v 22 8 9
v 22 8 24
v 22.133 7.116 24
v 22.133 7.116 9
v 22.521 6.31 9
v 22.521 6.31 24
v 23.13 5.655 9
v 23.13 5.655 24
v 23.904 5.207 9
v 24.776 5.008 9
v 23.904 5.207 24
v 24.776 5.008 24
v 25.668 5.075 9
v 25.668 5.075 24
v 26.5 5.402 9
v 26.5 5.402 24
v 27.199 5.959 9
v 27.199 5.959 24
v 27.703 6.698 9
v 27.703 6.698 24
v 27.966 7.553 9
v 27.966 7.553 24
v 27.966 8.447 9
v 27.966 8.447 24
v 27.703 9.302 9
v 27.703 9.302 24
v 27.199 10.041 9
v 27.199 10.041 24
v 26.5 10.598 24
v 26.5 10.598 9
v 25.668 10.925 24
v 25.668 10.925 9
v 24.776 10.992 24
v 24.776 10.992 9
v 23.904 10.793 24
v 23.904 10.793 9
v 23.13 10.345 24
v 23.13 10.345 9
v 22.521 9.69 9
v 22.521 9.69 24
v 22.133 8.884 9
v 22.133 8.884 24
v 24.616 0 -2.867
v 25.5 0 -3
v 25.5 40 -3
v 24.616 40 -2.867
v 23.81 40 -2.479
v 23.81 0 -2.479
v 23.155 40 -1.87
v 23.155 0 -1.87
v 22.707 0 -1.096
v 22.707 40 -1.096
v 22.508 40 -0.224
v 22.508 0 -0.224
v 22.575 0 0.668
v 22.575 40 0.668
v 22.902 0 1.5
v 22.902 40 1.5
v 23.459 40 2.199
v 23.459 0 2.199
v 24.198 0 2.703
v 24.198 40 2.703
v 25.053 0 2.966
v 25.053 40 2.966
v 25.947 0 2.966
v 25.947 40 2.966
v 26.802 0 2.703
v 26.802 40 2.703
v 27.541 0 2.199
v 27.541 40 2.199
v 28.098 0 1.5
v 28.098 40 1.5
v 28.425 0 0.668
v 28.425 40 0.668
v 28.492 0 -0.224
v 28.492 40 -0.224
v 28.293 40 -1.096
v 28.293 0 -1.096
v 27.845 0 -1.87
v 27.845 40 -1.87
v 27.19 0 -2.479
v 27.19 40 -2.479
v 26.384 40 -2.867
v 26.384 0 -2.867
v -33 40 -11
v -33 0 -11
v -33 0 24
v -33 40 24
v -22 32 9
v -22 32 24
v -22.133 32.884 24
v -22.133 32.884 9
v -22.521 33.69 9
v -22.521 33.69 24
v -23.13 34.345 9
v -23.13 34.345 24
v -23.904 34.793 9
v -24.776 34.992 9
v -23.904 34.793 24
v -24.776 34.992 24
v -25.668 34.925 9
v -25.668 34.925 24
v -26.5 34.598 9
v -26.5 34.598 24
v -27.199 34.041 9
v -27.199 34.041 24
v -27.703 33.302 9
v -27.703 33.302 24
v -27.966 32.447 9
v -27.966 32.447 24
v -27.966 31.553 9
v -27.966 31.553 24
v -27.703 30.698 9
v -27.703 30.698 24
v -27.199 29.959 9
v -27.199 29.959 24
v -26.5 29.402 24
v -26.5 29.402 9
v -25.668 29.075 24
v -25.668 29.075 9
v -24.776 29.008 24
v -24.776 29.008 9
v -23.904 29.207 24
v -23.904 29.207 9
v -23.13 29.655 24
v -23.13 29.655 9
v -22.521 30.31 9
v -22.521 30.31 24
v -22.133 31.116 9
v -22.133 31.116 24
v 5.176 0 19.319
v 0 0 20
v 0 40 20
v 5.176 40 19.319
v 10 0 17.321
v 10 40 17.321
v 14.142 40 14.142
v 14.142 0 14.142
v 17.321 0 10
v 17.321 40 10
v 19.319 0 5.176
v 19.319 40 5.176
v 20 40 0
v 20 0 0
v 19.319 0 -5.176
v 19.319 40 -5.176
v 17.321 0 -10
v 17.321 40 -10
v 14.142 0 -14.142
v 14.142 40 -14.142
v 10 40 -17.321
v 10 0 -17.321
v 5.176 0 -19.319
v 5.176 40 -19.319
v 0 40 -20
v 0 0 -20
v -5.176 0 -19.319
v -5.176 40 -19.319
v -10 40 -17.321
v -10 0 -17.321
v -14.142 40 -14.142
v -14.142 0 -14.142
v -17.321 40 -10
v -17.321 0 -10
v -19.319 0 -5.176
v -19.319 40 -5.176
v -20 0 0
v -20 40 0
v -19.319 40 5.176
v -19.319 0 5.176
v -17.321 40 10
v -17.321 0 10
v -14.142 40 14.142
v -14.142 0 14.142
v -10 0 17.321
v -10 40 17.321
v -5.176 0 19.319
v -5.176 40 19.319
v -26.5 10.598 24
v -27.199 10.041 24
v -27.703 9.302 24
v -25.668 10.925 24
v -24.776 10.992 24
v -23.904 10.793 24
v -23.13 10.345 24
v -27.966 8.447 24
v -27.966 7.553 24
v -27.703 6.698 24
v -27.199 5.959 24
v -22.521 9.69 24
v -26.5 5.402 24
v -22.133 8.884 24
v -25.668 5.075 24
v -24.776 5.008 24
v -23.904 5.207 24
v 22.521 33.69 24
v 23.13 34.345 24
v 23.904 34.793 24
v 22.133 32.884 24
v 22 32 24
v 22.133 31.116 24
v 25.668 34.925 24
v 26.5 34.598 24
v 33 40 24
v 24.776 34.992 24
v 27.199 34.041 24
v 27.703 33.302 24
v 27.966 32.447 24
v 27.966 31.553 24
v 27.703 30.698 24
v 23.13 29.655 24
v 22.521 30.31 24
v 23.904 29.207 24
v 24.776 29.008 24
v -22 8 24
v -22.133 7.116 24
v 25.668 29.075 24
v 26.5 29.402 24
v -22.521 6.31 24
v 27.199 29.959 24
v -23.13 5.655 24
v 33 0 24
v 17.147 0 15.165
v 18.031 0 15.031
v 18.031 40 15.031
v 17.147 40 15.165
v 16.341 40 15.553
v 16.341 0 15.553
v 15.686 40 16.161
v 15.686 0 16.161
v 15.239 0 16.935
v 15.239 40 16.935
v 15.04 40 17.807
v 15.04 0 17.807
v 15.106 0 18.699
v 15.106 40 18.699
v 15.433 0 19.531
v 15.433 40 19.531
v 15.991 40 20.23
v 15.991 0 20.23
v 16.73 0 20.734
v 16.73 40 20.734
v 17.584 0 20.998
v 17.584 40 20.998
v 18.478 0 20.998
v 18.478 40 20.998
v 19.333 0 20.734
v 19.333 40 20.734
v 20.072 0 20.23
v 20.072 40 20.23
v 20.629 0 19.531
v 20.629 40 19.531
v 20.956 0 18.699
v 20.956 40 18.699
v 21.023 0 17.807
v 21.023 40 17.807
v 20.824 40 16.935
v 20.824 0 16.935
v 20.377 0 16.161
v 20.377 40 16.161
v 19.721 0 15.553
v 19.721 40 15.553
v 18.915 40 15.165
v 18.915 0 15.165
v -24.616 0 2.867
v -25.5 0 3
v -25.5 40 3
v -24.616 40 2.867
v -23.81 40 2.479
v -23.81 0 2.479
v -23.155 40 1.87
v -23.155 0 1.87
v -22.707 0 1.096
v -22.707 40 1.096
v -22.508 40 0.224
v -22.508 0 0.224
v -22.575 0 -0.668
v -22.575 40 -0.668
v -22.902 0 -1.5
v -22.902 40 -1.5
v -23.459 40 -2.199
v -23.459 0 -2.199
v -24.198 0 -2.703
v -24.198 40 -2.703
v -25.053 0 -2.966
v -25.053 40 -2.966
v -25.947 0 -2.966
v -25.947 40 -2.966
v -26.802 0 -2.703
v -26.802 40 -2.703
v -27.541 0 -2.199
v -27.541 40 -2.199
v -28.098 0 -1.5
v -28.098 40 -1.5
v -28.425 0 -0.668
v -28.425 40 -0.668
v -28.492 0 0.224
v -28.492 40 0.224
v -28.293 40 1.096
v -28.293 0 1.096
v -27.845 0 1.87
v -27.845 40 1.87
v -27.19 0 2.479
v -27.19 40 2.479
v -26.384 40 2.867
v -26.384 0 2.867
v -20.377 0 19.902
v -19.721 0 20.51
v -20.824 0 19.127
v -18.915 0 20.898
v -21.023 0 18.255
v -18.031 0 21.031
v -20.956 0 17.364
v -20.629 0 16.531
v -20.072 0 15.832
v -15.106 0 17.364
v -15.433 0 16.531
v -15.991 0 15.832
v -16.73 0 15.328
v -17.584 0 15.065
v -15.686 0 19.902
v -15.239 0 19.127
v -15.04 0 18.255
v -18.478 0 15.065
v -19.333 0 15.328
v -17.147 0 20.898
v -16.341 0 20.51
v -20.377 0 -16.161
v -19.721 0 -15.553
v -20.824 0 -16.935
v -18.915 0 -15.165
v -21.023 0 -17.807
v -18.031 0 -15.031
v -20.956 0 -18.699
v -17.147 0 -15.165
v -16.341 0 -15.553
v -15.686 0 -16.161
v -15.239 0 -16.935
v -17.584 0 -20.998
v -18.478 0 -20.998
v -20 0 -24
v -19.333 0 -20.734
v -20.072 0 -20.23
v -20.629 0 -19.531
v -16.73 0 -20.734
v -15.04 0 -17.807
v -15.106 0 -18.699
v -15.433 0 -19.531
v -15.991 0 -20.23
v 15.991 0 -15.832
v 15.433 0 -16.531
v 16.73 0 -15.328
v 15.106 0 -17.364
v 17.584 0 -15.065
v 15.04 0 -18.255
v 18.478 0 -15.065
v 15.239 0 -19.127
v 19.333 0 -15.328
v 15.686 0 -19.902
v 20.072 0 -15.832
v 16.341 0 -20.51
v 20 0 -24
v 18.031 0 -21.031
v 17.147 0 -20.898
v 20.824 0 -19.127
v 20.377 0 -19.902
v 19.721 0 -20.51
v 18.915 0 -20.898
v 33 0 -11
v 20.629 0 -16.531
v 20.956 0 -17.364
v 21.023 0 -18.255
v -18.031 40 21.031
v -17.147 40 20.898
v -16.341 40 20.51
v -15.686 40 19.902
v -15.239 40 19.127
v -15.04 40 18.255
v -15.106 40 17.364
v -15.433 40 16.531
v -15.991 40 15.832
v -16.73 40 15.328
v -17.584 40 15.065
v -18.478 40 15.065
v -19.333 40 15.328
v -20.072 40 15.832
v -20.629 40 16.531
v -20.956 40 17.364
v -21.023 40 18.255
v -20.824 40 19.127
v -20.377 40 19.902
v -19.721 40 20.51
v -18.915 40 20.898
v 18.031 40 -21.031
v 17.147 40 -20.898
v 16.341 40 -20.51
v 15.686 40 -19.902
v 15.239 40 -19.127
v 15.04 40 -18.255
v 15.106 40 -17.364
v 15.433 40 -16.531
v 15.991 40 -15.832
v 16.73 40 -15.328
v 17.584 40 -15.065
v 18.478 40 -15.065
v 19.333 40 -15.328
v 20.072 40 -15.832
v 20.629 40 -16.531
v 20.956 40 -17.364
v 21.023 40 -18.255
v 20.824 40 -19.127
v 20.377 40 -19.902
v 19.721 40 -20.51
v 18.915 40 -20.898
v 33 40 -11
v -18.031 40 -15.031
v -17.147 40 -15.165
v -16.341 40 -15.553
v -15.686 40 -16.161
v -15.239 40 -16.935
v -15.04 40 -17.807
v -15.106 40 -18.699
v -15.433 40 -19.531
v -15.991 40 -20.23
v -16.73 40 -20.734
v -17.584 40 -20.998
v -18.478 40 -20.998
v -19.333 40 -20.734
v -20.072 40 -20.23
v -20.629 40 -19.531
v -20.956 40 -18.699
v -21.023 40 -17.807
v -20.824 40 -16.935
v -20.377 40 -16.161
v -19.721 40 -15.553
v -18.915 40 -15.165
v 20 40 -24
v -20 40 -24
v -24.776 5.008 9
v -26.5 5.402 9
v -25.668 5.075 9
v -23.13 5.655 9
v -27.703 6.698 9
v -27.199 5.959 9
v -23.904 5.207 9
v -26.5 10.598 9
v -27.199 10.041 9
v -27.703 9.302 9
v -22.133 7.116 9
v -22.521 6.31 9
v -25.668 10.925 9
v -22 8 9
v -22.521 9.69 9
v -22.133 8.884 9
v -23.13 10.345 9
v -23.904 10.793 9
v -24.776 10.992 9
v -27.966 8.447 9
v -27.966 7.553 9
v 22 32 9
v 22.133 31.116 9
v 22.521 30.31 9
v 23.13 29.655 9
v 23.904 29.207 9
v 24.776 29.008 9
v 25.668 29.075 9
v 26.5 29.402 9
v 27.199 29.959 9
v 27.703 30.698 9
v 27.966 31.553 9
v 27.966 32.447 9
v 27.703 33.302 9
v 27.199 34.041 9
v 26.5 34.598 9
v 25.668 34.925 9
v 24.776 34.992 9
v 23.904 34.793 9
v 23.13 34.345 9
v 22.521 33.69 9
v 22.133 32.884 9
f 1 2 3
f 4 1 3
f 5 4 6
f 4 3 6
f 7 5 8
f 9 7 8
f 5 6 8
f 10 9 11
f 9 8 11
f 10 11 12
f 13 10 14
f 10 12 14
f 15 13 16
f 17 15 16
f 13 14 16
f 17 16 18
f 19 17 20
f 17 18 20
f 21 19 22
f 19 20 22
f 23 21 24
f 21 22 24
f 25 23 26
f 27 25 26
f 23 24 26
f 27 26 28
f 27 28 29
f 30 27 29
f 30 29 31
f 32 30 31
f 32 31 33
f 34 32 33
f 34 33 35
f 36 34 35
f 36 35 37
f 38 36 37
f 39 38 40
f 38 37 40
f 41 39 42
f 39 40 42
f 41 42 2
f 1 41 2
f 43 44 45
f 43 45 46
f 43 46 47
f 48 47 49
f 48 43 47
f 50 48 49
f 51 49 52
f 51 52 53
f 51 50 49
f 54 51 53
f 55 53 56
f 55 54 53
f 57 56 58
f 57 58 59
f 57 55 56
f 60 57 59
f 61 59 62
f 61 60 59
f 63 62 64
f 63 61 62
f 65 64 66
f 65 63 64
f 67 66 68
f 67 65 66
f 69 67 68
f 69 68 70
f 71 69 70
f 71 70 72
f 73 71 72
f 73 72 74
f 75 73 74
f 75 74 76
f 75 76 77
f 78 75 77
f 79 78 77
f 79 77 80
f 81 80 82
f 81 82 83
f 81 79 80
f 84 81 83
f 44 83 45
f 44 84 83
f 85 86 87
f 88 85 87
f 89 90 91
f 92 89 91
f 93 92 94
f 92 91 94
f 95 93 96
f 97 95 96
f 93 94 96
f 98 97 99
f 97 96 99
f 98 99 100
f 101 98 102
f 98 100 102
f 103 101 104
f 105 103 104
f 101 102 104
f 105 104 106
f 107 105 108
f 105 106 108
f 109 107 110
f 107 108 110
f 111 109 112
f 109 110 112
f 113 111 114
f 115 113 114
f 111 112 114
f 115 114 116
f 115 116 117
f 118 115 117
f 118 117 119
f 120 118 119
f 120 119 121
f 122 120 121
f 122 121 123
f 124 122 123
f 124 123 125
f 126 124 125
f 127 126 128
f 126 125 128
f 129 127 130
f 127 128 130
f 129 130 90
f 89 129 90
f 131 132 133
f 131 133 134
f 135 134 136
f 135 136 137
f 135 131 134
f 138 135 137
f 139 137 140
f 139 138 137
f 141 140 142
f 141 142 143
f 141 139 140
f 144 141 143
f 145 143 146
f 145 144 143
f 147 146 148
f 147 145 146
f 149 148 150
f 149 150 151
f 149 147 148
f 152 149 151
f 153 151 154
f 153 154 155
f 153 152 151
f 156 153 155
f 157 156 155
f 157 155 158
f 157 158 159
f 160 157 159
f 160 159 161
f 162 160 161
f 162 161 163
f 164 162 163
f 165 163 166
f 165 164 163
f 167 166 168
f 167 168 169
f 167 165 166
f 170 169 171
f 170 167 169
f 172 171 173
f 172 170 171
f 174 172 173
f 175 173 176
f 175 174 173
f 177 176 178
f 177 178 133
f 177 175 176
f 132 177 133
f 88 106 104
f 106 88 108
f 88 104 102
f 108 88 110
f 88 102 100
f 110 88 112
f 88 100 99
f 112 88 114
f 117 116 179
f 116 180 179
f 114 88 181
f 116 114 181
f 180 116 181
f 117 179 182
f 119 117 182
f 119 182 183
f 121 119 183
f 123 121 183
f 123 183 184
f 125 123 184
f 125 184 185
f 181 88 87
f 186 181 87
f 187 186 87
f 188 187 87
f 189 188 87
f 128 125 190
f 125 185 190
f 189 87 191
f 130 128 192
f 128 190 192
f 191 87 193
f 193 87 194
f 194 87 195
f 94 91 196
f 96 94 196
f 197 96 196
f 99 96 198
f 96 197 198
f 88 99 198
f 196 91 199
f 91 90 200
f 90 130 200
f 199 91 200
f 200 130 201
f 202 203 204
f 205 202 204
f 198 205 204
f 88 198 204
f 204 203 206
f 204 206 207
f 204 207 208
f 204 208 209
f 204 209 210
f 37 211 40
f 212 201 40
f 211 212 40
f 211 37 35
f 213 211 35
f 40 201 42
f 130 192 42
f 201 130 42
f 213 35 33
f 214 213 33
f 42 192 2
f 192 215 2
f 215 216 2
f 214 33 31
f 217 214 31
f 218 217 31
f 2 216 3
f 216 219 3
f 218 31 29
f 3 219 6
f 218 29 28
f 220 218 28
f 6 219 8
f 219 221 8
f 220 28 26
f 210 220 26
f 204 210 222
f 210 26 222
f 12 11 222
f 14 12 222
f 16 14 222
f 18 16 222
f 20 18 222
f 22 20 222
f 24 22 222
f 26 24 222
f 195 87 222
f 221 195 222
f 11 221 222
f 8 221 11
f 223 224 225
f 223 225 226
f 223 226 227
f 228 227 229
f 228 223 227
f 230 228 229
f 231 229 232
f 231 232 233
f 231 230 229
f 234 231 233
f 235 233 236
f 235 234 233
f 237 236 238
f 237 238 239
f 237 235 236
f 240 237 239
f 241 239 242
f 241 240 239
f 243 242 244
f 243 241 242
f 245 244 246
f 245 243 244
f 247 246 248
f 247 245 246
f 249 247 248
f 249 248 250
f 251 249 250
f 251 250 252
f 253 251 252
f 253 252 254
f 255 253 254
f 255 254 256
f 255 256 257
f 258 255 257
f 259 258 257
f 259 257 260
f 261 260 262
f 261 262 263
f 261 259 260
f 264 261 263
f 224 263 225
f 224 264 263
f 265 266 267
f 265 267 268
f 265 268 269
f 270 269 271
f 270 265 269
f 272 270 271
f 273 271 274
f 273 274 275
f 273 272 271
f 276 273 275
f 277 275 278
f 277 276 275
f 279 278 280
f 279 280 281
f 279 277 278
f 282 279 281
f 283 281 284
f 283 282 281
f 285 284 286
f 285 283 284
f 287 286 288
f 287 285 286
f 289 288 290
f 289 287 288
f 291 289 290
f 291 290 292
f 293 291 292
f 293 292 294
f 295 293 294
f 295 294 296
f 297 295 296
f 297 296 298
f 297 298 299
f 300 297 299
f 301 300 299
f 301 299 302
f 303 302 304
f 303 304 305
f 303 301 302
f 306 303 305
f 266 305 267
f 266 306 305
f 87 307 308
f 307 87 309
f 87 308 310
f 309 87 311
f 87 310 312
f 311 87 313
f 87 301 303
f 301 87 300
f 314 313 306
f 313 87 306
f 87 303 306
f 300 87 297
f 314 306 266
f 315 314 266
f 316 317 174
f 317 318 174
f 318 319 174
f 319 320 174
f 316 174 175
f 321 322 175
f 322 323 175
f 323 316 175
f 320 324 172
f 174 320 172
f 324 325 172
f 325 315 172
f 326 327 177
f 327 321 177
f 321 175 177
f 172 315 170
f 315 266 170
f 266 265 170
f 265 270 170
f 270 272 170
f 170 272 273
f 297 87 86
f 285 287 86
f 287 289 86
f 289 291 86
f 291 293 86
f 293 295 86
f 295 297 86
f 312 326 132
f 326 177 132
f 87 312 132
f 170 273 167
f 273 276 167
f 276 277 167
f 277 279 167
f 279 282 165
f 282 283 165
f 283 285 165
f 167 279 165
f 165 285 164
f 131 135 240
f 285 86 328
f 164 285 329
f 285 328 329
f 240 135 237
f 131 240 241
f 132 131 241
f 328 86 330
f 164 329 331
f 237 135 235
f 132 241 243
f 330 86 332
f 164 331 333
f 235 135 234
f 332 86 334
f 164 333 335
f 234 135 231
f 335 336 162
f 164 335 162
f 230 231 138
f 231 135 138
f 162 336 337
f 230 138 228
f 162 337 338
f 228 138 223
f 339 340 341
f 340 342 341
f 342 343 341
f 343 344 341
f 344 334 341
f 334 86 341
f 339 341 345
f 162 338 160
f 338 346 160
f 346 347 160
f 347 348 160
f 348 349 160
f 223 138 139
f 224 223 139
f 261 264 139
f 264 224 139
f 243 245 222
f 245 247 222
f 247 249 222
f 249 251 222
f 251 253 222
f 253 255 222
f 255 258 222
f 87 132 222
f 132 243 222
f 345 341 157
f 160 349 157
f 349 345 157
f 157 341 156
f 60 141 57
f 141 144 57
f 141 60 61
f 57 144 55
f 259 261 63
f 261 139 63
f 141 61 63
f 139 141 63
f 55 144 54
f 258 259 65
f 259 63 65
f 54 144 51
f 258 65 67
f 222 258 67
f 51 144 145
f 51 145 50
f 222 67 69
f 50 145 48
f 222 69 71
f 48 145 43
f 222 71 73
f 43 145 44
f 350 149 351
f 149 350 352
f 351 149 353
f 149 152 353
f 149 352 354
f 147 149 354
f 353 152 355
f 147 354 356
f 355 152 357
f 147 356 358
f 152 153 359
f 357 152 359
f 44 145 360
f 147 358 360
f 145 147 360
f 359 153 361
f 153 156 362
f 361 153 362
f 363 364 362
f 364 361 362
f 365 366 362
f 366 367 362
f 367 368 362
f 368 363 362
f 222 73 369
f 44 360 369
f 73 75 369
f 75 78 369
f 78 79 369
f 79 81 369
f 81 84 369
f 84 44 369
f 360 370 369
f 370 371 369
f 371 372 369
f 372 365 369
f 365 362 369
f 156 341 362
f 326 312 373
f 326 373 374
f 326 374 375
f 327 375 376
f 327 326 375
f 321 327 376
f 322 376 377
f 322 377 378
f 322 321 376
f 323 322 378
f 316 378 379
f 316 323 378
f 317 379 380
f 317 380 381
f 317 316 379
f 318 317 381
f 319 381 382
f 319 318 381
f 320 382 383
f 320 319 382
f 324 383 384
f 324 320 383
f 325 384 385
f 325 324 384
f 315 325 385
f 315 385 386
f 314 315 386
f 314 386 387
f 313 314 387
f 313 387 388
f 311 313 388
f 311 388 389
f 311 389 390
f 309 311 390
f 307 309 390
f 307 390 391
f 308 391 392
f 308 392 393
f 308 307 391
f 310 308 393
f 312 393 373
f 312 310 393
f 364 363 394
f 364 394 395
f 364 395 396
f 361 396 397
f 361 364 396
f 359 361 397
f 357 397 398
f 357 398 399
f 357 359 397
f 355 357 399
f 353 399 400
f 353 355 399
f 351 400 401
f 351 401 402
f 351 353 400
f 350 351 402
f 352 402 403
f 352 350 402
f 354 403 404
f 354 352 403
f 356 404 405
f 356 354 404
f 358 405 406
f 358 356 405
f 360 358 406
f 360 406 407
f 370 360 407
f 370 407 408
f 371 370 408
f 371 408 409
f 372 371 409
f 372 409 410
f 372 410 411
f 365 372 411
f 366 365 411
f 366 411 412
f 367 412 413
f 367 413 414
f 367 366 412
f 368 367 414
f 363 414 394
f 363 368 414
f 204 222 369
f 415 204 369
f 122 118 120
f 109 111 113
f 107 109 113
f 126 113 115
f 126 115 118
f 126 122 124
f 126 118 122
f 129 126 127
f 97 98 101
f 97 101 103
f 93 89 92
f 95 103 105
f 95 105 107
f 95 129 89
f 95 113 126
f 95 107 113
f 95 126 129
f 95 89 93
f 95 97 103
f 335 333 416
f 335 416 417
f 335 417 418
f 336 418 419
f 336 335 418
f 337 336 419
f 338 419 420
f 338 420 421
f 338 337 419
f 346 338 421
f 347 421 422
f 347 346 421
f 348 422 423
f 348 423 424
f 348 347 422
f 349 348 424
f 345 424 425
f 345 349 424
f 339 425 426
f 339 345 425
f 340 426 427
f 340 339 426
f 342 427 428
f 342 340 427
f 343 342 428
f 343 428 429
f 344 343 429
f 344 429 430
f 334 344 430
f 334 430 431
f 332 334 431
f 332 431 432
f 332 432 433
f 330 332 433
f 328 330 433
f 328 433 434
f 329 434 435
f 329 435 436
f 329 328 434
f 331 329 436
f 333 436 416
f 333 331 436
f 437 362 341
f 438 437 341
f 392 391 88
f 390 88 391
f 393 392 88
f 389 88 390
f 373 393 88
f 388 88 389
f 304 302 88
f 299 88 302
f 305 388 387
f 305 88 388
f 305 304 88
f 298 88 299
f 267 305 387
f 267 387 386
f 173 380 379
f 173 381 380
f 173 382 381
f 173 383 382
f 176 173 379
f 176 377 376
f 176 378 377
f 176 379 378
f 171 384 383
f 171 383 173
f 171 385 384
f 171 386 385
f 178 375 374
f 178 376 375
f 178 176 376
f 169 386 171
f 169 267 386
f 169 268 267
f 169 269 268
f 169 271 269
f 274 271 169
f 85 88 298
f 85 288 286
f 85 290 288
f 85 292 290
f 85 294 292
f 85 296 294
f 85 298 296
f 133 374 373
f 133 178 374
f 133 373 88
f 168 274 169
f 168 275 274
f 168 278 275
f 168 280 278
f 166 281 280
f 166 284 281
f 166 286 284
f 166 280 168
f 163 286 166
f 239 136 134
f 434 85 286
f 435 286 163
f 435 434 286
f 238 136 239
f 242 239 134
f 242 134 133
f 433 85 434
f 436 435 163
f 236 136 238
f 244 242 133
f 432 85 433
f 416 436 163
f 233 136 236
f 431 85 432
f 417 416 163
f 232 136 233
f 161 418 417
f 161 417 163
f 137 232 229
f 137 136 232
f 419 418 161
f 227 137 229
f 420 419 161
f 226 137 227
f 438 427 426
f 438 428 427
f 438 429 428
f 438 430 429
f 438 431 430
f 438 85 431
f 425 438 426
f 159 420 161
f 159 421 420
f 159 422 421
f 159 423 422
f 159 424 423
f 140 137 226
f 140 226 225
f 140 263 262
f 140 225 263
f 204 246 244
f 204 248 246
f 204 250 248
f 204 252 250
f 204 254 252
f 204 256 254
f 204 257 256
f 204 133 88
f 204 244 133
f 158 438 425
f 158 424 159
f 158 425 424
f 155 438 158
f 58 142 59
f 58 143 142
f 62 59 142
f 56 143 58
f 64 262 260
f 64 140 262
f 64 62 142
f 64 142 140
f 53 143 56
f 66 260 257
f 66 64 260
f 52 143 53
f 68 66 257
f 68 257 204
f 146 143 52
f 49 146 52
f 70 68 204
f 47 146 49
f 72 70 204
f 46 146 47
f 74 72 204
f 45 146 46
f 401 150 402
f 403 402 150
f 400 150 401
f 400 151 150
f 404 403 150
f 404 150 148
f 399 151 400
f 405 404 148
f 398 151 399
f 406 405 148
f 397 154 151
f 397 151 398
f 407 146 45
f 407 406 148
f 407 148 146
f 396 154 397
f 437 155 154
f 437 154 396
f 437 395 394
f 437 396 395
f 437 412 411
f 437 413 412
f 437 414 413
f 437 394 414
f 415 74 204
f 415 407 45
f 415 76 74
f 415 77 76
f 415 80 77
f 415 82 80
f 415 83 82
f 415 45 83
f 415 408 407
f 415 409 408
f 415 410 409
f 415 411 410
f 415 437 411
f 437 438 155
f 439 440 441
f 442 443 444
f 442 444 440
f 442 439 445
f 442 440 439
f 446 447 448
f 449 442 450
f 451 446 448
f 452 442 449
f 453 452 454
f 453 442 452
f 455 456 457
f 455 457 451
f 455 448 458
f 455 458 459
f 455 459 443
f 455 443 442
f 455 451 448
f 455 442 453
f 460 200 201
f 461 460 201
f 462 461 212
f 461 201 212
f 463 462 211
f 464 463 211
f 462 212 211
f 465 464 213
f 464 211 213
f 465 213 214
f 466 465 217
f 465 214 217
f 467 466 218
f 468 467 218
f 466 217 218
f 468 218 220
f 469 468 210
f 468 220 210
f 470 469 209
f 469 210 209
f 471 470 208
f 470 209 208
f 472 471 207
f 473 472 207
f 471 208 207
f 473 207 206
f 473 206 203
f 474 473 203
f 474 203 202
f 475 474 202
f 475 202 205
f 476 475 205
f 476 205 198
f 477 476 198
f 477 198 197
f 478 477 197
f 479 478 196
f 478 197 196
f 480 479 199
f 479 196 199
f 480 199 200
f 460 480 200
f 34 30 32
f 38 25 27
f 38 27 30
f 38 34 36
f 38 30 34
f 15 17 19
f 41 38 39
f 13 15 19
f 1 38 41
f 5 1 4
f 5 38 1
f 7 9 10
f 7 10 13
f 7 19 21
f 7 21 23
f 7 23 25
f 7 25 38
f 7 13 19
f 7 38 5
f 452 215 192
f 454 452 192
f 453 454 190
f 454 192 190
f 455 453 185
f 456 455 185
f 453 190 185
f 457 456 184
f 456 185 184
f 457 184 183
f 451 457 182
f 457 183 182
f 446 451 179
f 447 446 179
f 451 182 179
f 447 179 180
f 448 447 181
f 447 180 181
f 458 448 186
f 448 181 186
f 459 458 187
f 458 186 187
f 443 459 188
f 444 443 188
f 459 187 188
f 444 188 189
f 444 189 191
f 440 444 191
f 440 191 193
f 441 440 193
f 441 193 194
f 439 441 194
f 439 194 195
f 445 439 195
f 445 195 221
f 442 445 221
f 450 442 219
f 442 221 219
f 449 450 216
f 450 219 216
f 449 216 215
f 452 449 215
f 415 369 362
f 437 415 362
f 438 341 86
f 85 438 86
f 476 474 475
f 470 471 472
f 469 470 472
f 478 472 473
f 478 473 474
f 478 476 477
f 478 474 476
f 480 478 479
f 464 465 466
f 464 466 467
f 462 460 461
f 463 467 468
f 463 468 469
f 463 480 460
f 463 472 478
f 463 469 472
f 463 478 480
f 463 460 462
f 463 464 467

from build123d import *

# Parameters (mm, degrees)
SKETCH_1_R          = 20
SKETCH_1_R_2        = 3
EXTRUDE_1_DEPTH     = 40
SKETCH_2_R          = 3
CUT_EXTRUDE_1_DEPTH = 15


with BuildPart() as part:
    # 草图1 → 凸台-拉伸1 (new body)
    with BuildSketch(Plane(origin=(0, 0, 0), x_dir=(1, 0, 0), z_dir=(0, 1, 0))):
        Polygon((-33, -24), (33, -24), (33, 11), (20, 24), (-20, 24), (-33, 11), align=None)
        with Locations(Location((0, 0, 0), (0, 0, 270))):
            Circle(SKETCH_1_R, mode=Mode.SUBTRACT)
        with Locations(Location((-25.5, 0, 0), (0, 0, 270))):
            Circle(SKETCH_1_R_2, mode=Mode.SUBTRACT)
        with Locations(Location((-18.03122292, 18.03122292, 0), (0, 0, 270))):
            Circle(SKETCH_1_R_2, mode=Mode.SUBTRACT)
        with Locations(Location((-18.03122292, -18.03122292, 0), (0, 0, 270))):
            Circle(SKETCH_1_R_2, mode=Mode.SUBTRACT)
        with Locations(Location((18.03122292, -18.03122292, 0), (0, 0, 90))):
            Circle(SKETCH_1_R_2, mode=Mode.SUBTRACT)
        with Locations(Location((18.03122292, 18.03122292, 0), (0, 0, 90))):
            Circle(SKETCH_1_R_2, mode=Mode.SUBTRACT)
        with Locations(Location((25.5, 0, 0), (0, 0, 90))):
            Circle(SKETCH_1_R_2, mode=Mode.SUBTRACT)
    extrude(amount=EXTRUDE_1_DEPTH)

    # 草图2 → 切除-拉伸1 (cut)
    with BuildSketch(Plane.XY.offset(24)):
        with Locations((-25, 32)):
            Circle(SKETCH_2_R)
        with Locations((-25, 8)):
            Circle(SKETCH_2_R)
        with Locations(Location((25, 8, 0), (0, 0, 180))):
            Circle(SKETCH_2_R)
        with Locations(Location((25, 32, 0), (0, 0, 180))):
            Circle(SKETCH_2_R)
    extrude(amount=-CUT_EXTRUDE_1_DEPTH, mode=Mode.SUBTRACT)


solid = part.part
